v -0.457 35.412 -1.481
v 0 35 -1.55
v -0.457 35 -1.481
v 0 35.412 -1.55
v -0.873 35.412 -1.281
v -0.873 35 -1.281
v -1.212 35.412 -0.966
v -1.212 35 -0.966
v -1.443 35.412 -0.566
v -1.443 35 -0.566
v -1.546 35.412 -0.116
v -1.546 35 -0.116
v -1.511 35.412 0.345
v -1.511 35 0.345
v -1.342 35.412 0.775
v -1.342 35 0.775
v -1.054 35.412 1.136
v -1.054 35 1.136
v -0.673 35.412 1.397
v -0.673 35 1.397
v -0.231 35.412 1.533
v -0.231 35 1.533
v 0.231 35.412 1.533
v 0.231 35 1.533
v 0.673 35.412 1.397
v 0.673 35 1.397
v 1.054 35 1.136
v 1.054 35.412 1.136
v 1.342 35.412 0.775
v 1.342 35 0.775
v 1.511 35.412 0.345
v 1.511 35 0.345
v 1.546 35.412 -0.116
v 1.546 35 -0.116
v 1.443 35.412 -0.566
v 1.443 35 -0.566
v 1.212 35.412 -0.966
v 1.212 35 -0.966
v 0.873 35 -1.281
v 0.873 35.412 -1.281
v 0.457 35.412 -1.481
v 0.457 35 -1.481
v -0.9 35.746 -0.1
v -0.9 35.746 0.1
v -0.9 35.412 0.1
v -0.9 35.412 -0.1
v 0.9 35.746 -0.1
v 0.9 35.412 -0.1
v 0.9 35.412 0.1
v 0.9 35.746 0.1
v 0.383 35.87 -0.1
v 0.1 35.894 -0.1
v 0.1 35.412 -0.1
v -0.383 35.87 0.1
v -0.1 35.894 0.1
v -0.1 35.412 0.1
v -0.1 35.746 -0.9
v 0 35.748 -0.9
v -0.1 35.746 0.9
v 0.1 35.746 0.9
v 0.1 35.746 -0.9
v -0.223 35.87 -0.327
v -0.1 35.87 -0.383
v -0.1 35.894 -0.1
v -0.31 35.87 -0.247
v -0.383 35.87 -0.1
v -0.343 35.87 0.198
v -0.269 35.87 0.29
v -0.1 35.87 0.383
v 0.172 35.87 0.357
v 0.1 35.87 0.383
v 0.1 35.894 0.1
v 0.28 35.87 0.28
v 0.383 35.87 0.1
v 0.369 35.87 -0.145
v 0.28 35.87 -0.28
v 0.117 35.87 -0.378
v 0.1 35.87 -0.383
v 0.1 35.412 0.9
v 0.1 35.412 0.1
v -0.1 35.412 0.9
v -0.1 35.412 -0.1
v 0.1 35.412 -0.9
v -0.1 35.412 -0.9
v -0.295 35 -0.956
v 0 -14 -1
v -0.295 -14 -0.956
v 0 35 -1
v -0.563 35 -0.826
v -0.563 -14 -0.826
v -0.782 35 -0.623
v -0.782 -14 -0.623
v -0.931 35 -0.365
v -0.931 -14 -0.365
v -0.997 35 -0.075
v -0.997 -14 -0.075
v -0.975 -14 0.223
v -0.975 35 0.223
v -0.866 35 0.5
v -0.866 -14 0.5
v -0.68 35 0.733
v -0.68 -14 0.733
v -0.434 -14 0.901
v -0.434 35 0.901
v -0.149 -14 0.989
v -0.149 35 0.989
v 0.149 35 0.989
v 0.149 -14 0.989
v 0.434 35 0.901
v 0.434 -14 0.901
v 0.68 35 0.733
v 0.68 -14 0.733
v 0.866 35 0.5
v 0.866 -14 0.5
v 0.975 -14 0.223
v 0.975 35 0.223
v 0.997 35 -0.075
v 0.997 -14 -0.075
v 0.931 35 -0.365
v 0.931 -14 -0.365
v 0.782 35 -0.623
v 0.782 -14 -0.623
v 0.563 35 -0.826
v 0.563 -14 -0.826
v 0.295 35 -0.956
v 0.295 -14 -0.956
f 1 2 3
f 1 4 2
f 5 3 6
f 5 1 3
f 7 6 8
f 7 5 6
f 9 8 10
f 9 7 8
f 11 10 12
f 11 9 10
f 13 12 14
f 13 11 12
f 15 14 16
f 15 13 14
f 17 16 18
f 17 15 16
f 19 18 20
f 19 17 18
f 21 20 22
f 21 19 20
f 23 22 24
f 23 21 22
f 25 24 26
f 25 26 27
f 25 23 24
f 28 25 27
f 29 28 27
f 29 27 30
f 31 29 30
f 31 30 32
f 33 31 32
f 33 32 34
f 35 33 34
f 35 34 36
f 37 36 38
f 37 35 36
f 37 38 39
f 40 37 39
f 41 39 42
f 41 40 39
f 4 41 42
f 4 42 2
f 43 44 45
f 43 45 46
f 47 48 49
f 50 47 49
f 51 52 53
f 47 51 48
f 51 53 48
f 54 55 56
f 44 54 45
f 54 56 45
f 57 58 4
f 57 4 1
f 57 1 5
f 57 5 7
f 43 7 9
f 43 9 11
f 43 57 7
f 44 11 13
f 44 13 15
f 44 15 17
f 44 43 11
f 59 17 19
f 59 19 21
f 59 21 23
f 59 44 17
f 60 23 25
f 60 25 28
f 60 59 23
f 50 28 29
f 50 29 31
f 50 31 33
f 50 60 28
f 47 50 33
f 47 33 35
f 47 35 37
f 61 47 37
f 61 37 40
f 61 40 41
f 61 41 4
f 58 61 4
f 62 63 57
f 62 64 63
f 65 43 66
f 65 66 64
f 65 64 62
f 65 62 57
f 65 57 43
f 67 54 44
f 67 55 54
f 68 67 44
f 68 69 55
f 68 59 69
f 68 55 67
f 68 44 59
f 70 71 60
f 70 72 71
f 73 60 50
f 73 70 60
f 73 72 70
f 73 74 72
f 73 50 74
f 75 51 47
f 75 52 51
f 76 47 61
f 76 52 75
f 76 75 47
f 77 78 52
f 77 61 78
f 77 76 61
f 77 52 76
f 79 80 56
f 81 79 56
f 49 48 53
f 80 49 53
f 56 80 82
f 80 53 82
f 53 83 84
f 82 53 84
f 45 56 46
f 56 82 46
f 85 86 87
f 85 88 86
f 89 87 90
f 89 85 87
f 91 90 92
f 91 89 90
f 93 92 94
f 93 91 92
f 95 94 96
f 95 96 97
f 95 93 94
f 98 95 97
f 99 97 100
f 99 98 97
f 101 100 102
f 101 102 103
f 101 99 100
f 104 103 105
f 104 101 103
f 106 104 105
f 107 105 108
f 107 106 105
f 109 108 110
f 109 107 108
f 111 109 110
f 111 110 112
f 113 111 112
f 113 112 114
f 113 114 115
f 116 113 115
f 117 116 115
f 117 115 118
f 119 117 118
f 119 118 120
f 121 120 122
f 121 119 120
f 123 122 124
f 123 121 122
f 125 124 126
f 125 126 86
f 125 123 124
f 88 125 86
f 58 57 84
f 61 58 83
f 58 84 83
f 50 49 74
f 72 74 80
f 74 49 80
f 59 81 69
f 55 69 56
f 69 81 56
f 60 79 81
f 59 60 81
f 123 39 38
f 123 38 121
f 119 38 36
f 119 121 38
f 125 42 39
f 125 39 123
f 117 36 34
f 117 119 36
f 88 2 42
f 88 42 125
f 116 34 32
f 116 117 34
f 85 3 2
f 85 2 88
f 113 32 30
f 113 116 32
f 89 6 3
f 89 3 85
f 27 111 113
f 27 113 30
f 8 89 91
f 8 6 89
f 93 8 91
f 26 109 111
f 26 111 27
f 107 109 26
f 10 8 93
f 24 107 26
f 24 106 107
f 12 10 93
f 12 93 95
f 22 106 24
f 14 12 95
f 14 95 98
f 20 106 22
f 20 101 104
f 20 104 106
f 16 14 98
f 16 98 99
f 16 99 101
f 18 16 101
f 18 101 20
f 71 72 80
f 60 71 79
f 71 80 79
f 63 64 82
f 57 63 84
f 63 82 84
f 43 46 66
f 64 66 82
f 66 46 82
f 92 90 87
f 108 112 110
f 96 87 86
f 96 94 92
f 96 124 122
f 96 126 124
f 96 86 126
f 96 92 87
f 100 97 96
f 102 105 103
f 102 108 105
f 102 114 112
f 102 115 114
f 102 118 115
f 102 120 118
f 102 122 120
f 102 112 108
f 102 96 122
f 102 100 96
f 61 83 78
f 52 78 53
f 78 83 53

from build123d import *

# Parameters (mm, degrees)
CUT_EXTRUDE_2_DEPTH = 10


with BuildPart() as part:
    # 草图5 → 旋转1 (revolve)
    with BuildSketch(Plane.XY, mode=Mode.PRIVATE) as revolve_1_sk:
        with BuildLine():
            Line((0, -14), (-1, -14))
            Line((-1, -14), (-1, 35))
            Line((-1, 35), (-1.55, 35))
            Line((-1.55, 35), (-1.55, 35.411529967))
            add(Edge.make_bspline(
                [(-1.55, 35.411529967), (-0.860800082, 35.895988097), (0, 35.897418779)],
                knots=[0, 0, 0, 1, 1, 1], degree=2))
            Line((0, 35.897418779), (0, -14))
        make_face()
    revolve(revolve_1_sk.sketch.rotate(Axis((0, 0, 0), (0, 1, 0)), 270), axis=Axis((0, 0, 0), (0, 1, 0)))

    # 草图6 → 切除-拉伸2 (cut)
    with BuildSketch(Plane(origin=(0, 35.411529967, 0), x_dir=(-1, 0, 0), z_dir=(0, -1, 0))):
        Polygon((0.1, -0.1), (0.9, -0.1), (0.9, 0.1), (0.1, 0.1), (0.1, 0.9), (-0.1, 0.9), (-0.1, 0.1), (-0.9, 0.1), (-0.9, -0.1), (-0.1, -0.1), (-0.1, -0.9), (0.1, -0.9), align=None)
    extrude(amount=-CUT_EXTRUDE_2_DEPTH, mode=Mode.SUBTRACT)


solid = part.part
